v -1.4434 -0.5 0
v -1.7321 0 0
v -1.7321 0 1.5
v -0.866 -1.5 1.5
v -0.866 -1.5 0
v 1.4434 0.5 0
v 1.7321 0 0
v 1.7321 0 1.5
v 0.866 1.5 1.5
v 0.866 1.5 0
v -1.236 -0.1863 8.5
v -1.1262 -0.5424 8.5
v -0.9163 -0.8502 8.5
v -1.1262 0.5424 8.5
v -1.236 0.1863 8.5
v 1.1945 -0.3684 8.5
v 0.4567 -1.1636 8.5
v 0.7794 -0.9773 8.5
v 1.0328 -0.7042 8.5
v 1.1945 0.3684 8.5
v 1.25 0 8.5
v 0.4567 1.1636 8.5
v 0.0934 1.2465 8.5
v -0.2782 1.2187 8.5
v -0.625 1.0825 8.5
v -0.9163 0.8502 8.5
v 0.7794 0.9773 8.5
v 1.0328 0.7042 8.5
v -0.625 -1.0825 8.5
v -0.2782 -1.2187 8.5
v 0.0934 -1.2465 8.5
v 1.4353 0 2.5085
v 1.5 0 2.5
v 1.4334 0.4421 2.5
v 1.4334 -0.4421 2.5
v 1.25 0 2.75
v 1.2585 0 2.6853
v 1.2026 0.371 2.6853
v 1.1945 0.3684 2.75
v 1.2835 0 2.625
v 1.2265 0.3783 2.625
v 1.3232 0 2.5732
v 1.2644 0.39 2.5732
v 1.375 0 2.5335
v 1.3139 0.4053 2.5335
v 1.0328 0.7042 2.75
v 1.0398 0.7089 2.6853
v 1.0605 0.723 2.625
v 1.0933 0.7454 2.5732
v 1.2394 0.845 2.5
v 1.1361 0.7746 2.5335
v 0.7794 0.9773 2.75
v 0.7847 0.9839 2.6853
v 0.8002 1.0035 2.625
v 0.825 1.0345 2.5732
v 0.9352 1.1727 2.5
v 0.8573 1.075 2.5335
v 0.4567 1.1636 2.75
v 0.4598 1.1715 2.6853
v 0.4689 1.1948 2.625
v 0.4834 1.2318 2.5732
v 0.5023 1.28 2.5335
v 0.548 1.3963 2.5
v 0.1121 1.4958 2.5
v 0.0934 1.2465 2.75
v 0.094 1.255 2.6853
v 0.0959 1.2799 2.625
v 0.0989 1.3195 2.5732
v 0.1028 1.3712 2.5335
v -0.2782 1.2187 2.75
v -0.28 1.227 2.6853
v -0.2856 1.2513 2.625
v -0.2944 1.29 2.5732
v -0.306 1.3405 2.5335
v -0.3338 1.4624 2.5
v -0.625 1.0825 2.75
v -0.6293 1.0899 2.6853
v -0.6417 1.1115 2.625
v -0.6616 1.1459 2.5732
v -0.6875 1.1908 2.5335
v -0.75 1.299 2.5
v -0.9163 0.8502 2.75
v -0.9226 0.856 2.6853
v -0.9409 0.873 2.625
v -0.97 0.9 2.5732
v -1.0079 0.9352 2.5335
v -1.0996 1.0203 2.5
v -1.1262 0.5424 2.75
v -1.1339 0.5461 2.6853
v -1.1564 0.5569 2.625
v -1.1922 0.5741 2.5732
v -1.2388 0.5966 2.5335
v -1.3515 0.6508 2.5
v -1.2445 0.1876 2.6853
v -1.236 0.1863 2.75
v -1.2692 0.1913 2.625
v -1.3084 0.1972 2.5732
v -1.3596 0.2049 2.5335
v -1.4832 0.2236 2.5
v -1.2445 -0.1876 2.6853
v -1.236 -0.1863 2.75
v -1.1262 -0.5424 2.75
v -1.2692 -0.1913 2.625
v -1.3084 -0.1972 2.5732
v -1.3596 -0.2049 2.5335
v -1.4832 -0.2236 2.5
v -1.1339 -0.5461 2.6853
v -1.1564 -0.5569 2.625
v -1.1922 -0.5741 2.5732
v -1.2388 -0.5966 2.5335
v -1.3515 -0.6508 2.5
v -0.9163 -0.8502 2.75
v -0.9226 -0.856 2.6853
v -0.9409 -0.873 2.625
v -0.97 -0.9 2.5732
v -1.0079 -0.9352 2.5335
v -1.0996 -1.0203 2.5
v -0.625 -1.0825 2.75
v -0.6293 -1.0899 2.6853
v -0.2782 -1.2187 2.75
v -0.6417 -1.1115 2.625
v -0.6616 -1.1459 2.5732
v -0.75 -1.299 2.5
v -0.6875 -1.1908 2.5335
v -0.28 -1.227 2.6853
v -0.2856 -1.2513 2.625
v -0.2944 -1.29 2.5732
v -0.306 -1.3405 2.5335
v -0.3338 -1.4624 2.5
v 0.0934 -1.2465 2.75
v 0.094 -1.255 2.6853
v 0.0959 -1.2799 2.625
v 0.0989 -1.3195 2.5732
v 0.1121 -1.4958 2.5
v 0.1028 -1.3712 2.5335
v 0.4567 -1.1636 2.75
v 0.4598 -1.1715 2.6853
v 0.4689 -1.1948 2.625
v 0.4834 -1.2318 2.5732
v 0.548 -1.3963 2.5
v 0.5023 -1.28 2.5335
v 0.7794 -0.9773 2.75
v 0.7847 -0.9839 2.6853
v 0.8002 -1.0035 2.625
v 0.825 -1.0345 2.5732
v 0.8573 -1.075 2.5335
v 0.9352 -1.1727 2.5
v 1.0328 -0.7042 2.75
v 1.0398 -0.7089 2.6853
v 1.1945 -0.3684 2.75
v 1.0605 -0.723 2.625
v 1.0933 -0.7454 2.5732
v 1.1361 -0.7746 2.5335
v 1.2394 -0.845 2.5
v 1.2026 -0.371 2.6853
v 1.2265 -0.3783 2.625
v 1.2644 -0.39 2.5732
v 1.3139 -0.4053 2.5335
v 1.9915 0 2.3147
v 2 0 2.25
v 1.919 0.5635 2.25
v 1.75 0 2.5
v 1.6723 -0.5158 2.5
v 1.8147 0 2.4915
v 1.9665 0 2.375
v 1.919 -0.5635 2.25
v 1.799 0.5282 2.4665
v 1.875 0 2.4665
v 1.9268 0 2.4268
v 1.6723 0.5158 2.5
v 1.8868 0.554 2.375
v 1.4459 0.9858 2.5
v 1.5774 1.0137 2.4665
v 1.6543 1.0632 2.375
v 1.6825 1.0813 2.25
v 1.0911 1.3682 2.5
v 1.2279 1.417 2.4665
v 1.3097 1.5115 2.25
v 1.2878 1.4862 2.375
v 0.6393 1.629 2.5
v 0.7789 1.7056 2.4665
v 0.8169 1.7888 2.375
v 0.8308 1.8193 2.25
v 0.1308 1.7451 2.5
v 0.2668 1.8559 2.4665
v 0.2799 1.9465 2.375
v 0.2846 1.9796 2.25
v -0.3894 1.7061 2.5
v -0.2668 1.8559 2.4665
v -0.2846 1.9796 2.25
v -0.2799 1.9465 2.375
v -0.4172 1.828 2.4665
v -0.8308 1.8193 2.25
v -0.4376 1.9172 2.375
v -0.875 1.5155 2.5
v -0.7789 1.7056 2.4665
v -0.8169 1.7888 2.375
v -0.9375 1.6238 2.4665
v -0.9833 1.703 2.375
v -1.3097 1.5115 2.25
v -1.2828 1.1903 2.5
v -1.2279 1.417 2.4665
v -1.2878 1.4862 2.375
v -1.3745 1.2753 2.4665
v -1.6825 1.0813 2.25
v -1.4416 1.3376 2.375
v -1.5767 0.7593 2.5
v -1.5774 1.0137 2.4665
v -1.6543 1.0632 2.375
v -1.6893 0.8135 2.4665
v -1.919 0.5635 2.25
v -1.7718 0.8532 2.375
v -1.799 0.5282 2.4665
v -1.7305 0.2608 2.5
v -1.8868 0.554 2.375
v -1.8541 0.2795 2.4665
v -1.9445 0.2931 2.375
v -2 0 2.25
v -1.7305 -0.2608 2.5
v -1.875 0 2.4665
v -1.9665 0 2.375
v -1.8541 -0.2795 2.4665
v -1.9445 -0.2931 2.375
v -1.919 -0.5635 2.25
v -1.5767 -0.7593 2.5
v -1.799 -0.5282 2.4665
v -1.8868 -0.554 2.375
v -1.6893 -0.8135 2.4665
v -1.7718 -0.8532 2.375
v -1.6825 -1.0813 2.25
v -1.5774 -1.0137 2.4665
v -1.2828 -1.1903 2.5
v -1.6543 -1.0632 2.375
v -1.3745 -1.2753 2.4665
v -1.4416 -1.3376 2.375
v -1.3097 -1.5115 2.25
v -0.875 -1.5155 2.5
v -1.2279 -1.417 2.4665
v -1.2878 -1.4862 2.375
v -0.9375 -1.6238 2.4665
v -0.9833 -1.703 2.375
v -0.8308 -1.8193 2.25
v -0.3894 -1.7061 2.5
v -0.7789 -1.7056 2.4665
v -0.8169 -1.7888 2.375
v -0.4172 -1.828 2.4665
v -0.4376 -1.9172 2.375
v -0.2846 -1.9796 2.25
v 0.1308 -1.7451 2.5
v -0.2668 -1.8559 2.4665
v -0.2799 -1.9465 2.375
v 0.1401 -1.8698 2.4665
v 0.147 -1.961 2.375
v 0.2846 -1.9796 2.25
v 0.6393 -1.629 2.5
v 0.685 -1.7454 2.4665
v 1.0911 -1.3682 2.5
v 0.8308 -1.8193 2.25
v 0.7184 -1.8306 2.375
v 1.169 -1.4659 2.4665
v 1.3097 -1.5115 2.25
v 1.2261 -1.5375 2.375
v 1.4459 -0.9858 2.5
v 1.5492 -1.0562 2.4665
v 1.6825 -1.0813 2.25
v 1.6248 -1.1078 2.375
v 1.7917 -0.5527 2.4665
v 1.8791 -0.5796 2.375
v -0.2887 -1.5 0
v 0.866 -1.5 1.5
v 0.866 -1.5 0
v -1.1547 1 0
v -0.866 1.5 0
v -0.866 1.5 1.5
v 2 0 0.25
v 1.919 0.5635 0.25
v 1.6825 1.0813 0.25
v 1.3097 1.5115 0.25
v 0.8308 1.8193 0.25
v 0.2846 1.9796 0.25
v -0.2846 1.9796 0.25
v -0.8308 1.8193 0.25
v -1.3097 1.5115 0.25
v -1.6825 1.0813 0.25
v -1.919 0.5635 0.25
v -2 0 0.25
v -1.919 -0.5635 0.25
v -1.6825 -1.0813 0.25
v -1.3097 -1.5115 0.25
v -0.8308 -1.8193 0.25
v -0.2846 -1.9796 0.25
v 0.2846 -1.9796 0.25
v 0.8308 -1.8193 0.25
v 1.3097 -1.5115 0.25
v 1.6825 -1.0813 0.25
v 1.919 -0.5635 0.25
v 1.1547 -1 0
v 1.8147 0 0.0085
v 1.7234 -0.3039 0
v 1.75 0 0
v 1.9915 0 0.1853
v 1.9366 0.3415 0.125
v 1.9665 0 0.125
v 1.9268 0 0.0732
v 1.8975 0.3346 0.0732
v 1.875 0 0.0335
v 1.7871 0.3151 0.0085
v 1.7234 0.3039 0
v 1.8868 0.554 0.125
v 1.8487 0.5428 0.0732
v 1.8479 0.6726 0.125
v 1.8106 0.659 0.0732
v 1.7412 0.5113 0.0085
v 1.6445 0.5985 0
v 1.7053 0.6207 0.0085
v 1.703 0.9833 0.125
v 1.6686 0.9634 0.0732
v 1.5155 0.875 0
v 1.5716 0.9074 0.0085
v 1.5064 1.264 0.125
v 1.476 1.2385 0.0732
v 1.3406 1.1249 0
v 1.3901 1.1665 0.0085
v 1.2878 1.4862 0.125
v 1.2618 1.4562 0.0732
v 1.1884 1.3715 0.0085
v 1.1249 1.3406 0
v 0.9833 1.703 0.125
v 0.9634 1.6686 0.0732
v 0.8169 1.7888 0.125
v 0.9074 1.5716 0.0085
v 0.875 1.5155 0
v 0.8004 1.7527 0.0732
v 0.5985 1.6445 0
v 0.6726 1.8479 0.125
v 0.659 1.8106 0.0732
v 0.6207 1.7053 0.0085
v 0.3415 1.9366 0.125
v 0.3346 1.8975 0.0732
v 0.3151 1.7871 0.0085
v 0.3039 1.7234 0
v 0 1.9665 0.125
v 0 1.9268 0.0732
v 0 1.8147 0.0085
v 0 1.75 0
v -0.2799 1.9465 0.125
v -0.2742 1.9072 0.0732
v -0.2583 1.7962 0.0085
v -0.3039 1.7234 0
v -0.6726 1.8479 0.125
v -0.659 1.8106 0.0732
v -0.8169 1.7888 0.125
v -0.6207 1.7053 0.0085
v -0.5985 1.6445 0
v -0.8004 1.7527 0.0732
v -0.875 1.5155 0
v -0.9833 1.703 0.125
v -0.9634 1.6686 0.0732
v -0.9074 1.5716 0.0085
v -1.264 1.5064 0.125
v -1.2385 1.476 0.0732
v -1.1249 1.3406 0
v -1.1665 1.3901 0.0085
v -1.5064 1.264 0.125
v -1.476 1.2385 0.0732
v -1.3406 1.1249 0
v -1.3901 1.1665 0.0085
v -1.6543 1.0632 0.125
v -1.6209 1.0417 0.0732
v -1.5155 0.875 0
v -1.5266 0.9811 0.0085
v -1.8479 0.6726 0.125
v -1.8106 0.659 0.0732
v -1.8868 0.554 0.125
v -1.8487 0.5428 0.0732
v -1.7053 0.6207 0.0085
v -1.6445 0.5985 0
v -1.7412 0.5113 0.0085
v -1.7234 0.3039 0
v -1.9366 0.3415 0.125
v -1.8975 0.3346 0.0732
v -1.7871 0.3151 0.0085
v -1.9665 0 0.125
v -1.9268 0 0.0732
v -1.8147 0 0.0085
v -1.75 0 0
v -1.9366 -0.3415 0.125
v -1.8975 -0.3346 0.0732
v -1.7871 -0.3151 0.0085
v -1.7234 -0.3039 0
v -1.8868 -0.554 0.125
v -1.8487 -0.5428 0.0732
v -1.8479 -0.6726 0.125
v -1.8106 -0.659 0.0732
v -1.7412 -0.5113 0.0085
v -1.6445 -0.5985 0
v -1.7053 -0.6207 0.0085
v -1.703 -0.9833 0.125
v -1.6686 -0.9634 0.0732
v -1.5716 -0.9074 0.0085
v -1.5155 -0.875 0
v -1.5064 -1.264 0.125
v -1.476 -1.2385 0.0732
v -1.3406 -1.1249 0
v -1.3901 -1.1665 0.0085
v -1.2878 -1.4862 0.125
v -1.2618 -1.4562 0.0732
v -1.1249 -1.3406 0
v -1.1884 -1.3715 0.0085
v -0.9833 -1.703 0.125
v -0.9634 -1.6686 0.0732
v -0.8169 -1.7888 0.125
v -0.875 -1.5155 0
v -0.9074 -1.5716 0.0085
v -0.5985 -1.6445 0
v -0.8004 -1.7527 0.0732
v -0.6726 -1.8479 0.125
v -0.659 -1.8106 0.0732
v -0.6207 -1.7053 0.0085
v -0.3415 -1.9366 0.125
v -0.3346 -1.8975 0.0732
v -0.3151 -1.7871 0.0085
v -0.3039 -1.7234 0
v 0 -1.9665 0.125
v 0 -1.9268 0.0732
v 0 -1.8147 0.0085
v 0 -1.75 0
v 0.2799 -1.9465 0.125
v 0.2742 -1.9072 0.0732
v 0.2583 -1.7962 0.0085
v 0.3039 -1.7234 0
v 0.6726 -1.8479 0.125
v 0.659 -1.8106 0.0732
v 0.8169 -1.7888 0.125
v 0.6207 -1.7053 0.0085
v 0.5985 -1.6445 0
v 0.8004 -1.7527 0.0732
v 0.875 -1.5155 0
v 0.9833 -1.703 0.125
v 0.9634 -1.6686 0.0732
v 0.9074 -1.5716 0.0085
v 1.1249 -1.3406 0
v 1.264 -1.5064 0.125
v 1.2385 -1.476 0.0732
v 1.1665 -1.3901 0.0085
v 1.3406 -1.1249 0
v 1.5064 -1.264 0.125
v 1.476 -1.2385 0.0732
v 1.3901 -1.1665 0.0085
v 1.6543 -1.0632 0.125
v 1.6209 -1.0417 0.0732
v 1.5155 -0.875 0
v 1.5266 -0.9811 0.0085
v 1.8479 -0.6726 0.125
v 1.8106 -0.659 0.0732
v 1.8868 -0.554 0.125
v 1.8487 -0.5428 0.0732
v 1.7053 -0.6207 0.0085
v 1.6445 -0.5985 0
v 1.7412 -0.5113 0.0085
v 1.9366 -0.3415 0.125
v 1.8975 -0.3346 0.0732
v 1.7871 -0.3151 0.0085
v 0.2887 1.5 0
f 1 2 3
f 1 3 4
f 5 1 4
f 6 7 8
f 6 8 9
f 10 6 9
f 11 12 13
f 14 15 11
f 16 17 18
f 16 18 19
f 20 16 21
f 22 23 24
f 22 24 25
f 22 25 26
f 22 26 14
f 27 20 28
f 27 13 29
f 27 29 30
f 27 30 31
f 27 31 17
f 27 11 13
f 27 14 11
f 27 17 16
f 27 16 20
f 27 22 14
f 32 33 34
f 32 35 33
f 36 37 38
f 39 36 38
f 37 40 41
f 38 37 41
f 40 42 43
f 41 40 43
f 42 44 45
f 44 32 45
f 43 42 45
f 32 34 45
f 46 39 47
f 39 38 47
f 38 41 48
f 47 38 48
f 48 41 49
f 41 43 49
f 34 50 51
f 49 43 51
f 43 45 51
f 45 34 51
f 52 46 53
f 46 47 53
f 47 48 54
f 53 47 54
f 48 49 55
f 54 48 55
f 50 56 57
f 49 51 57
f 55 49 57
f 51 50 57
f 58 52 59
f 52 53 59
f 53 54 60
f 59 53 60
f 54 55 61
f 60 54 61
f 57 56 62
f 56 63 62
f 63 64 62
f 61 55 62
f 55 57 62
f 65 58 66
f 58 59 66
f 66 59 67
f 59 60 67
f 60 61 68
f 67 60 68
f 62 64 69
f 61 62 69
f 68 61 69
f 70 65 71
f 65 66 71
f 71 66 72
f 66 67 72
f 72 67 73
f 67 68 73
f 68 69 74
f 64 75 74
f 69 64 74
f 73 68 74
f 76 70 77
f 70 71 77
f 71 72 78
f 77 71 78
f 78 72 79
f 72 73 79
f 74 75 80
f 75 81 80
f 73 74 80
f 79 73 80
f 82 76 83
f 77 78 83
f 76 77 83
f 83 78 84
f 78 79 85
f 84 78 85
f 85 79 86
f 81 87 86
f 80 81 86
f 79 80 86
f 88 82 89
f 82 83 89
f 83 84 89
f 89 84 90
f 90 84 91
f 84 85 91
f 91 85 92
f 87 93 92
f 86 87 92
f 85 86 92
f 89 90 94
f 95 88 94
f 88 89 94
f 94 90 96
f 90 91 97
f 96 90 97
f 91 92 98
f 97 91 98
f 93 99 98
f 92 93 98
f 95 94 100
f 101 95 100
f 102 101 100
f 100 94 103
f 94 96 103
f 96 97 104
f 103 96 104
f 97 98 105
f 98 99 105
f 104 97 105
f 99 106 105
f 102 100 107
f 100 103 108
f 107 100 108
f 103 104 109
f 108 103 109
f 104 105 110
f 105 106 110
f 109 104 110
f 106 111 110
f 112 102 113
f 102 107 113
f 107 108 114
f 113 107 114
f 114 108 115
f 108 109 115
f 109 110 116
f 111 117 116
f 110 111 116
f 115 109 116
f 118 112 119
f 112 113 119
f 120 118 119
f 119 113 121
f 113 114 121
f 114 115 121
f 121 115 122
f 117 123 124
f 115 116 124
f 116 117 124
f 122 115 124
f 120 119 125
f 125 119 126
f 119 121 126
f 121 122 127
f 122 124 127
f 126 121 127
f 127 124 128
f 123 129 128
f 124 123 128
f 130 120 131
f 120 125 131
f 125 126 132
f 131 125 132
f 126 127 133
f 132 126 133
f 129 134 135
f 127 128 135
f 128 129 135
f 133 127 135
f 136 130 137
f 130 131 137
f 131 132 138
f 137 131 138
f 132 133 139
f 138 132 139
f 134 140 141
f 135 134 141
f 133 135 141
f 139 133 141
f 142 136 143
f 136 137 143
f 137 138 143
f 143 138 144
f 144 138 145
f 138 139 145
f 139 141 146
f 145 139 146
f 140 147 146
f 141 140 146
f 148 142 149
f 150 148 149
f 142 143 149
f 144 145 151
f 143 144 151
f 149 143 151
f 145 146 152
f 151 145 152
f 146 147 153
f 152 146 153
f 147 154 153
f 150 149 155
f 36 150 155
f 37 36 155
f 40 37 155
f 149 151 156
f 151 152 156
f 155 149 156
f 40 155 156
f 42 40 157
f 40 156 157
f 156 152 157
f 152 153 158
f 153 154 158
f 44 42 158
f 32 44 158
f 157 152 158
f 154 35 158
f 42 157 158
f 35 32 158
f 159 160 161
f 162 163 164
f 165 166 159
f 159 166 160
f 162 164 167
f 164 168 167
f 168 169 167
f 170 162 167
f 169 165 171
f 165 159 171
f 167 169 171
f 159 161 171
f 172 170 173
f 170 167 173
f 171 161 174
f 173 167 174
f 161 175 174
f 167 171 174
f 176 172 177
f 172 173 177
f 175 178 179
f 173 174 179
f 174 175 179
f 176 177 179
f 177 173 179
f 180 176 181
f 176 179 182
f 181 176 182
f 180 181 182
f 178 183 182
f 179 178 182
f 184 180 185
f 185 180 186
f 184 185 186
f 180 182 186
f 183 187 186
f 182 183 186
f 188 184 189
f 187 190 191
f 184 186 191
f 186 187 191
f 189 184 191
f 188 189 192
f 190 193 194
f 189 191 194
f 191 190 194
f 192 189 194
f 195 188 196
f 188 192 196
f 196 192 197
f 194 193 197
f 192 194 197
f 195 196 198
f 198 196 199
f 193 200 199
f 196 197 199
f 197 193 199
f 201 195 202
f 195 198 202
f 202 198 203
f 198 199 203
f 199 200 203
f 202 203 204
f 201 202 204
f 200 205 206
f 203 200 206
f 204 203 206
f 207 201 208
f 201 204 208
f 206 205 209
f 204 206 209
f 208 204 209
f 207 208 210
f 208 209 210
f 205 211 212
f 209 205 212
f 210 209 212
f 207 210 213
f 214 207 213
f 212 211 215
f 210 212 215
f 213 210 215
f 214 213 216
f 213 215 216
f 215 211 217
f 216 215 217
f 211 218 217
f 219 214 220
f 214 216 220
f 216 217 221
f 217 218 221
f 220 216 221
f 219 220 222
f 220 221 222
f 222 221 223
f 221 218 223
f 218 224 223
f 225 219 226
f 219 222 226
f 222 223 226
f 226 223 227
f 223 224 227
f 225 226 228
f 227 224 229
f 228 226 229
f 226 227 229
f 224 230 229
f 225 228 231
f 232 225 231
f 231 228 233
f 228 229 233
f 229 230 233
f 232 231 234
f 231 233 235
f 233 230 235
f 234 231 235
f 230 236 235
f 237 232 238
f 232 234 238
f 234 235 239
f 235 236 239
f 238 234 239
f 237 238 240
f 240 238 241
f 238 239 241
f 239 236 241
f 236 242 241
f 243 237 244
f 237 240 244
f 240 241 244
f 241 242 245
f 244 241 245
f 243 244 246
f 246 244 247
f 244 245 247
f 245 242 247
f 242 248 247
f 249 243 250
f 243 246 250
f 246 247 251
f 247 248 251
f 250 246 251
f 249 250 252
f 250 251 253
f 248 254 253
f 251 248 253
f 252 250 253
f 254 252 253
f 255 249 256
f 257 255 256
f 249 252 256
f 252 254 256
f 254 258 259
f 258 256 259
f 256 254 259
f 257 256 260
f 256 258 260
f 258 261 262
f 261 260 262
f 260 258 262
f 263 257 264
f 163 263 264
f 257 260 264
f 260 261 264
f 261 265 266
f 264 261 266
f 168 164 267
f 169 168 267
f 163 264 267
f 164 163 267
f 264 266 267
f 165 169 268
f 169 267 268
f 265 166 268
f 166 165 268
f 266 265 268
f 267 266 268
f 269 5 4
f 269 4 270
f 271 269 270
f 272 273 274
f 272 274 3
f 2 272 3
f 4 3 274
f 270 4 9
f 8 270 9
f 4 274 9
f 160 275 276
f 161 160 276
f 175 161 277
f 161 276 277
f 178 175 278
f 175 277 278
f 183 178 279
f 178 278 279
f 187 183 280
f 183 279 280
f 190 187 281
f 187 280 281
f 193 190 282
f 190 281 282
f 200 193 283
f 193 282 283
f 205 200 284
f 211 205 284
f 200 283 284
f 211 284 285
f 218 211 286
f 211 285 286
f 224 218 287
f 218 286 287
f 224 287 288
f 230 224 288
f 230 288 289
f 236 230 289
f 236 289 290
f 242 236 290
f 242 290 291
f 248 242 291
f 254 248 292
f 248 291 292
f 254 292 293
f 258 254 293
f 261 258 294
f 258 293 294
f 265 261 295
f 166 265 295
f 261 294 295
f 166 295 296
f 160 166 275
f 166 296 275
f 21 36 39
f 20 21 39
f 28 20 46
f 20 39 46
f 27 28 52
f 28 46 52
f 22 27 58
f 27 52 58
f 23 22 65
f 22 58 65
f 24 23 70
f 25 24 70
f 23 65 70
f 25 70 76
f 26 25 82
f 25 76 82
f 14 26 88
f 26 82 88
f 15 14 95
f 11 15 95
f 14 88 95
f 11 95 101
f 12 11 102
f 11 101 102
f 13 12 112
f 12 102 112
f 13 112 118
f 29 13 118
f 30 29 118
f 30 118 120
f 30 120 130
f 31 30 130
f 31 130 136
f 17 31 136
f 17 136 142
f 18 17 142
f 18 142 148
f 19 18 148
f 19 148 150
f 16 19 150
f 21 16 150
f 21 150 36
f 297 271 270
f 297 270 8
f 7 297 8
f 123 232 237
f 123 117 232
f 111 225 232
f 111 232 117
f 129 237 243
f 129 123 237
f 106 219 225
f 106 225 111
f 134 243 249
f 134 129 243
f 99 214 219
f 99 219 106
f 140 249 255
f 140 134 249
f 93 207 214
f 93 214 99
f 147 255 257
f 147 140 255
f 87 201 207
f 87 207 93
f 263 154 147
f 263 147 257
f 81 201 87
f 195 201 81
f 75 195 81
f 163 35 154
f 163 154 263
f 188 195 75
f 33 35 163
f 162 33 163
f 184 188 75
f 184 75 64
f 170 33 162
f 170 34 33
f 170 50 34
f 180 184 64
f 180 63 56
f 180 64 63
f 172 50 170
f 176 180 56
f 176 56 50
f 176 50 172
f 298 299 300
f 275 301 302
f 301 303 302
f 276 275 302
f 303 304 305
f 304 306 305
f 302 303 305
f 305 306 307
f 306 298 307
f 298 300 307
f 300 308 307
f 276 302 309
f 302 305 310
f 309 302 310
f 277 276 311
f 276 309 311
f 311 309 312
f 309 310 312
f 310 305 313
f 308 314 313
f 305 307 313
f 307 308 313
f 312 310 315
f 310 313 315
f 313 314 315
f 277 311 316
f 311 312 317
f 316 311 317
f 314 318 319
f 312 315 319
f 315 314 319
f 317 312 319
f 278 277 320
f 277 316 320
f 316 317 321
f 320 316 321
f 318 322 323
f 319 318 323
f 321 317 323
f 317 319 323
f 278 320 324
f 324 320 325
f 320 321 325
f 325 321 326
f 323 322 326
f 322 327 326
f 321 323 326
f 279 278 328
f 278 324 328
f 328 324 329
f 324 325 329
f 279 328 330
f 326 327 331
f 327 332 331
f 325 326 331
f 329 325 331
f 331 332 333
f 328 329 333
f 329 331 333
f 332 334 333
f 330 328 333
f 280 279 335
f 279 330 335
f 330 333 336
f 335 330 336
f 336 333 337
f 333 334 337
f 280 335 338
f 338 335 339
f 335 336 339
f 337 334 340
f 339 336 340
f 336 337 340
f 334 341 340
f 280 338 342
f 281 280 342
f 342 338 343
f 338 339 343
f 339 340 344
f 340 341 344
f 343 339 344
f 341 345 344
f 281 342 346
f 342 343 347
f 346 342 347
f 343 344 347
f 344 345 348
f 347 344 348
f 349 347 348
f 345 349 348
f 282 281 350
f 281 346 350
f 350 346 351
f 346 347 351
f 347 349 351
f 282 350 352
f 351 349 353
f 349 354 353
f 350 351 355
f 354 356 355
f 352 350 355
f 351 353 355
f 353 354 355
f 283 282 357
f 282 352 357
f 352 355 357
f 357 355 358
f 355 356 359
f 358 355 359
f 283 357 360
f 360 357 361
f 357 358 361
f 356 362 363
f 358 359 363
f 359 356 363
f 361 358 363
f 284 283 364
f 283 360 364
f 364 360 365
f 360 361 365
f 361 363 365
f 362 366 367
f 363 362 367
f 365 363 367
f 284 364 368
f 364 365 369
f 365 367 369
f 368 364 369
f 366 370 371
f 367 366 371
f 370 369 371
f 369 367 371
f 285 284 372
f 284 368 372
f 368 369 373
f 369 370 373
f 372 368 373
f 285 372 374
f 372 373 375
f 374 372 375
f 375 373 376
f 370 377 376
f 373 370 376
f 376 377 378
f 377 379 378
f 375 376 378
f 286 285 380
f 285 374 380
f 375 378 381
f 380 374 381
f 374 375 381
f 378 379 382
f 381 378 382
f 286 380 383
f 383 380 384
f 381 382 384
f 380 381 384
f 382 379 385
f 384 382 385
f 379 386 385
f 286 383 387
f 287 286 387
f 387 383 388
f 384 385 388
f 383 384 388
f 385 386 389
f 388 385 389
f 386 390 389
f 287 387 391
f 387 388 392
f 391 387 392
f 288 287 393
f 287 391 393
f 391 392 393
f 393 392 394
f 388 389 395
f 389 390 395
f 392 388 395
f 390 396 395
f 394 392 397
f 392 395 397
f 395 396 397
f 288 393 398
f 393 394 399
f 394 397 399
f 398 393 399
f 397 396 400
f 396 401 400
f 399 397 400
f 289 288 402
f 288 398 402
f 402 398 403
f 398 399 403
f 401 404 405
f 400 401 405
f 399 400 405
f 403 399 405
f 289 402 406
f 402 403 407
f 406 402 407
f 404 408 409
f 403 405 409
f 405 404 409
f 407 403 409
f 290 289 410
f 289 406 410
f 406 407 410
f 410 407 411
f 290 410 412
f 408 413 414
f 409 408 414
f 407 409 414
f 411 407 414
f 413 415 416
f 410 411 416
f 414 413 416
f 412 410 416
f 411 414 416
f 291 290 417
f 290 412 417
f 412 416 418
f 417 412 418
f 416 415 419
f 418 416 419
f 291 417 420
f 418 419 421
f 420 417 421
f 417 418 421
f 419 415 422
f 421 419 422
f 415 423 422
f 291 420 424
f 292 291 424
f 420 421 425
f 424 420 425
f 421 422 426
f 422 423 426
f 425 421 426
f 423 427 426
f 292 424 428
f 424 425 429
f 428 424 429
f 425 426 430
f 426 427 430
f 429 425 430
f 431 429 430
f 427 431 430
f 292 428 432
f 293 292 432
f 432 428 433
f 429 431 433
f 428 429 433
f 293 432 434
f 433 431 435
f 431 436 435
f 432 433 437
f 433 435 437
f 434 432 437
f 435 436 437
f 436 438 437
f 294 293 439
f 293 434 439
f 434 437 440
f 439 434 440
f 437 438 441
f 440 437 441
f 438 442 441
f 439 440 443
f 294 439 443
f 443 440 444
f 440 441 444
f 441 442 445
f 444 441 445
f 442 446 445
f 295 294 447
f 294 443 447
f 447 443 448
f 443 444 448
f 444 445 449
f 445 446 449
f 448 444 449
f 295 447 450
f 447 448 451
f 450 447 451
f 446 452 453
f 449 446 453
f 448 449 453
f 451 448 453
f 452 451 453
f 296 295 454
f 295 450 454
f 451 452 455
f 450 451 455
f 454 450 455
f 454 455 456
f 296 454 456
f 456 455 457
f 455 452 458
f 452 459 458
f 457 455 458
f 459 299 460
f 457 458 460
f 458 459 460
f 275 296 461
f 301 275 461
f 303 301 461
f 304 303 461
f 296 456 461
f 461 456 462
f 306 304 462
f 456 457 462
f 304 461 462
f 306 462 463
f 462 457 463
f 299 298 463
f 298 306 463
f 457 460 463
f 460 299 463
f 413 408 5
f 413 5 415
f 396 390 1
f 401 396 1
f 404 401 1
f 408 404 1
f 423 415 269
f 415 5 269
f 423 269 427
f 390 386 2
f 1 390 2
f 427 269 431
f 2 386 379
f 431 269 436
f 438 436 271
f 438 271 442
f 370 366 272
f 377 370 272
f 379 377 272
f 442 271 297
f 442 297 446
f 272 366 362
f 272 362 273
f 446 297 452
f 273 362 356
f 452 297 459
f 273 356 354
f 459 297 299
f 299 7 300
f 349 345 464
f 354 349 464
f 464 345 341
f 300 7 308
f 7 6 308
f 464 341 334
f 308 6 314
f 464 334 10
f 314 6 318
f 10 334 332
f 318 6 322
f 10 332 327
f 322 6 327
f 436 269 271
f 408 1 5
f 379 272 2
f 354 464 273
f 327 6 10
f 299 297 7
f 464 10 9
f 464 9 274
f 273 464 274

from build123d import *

# Parameters (mm, degrees)
F0_R      = 2
F0_R_2    = 1.25
F1_DEPTH  = 2.5
F2_DEPTH  = 8.5
F3_R      = 1.25
F2_FACE_R = 1.25
F4_DEPTH  = 1.5
F5_R      = 0.25


with BuildPart() as f1:
    # F0 (on Top) → F1 (new body)
    with BuildSketch(Plane.XY):
        Circle(F0_R)
        Circle(F0_R_2, mode=Mode.SUBTRACT)
    extrude(amount=F1_DEPTH)

    # F0 (on Top) → F2 (join)
    with BuildSketch(Plane.XY):
        Circle(F0_R_2)
    extrude(amount=F2_DEPTH)

    # F0 (on Top) + F3 (on face) + F2_face (on face) → F4 (cut)
    with BuildSketch(Plane.XY):
        Circle(F0_R_2)
    with BuildSketch(Plane.XY):
        Polygon((-0.8660254038, -1.5), (0.8660254038, -1.5), (1.7320508076, 0), (0.8660254038, 1.5), (-0.8660254038, 1.5), (-1.7320508076, 0), align=None)
        Circle(F3_R, mode=Mode.SUBTRACT)
        Circle(F3_R)
    with BuildSketch(Plane.XY.offset(8.5)):
        Circle(F2_FACE_R)
    extrude(amount=F4_DEPTH, mode=Mode.SUBTRACT)

    # F5
    f5_edges = [f1.edges().sort_by_distance(p)[0] for p in [
        (-1.25, 0, 2.5),
        (-2, 0, 2.5),
        (-2, 0, 0),
    ]]
    fillet(f5_edges, radius=F5_R)


solid = f1.part
